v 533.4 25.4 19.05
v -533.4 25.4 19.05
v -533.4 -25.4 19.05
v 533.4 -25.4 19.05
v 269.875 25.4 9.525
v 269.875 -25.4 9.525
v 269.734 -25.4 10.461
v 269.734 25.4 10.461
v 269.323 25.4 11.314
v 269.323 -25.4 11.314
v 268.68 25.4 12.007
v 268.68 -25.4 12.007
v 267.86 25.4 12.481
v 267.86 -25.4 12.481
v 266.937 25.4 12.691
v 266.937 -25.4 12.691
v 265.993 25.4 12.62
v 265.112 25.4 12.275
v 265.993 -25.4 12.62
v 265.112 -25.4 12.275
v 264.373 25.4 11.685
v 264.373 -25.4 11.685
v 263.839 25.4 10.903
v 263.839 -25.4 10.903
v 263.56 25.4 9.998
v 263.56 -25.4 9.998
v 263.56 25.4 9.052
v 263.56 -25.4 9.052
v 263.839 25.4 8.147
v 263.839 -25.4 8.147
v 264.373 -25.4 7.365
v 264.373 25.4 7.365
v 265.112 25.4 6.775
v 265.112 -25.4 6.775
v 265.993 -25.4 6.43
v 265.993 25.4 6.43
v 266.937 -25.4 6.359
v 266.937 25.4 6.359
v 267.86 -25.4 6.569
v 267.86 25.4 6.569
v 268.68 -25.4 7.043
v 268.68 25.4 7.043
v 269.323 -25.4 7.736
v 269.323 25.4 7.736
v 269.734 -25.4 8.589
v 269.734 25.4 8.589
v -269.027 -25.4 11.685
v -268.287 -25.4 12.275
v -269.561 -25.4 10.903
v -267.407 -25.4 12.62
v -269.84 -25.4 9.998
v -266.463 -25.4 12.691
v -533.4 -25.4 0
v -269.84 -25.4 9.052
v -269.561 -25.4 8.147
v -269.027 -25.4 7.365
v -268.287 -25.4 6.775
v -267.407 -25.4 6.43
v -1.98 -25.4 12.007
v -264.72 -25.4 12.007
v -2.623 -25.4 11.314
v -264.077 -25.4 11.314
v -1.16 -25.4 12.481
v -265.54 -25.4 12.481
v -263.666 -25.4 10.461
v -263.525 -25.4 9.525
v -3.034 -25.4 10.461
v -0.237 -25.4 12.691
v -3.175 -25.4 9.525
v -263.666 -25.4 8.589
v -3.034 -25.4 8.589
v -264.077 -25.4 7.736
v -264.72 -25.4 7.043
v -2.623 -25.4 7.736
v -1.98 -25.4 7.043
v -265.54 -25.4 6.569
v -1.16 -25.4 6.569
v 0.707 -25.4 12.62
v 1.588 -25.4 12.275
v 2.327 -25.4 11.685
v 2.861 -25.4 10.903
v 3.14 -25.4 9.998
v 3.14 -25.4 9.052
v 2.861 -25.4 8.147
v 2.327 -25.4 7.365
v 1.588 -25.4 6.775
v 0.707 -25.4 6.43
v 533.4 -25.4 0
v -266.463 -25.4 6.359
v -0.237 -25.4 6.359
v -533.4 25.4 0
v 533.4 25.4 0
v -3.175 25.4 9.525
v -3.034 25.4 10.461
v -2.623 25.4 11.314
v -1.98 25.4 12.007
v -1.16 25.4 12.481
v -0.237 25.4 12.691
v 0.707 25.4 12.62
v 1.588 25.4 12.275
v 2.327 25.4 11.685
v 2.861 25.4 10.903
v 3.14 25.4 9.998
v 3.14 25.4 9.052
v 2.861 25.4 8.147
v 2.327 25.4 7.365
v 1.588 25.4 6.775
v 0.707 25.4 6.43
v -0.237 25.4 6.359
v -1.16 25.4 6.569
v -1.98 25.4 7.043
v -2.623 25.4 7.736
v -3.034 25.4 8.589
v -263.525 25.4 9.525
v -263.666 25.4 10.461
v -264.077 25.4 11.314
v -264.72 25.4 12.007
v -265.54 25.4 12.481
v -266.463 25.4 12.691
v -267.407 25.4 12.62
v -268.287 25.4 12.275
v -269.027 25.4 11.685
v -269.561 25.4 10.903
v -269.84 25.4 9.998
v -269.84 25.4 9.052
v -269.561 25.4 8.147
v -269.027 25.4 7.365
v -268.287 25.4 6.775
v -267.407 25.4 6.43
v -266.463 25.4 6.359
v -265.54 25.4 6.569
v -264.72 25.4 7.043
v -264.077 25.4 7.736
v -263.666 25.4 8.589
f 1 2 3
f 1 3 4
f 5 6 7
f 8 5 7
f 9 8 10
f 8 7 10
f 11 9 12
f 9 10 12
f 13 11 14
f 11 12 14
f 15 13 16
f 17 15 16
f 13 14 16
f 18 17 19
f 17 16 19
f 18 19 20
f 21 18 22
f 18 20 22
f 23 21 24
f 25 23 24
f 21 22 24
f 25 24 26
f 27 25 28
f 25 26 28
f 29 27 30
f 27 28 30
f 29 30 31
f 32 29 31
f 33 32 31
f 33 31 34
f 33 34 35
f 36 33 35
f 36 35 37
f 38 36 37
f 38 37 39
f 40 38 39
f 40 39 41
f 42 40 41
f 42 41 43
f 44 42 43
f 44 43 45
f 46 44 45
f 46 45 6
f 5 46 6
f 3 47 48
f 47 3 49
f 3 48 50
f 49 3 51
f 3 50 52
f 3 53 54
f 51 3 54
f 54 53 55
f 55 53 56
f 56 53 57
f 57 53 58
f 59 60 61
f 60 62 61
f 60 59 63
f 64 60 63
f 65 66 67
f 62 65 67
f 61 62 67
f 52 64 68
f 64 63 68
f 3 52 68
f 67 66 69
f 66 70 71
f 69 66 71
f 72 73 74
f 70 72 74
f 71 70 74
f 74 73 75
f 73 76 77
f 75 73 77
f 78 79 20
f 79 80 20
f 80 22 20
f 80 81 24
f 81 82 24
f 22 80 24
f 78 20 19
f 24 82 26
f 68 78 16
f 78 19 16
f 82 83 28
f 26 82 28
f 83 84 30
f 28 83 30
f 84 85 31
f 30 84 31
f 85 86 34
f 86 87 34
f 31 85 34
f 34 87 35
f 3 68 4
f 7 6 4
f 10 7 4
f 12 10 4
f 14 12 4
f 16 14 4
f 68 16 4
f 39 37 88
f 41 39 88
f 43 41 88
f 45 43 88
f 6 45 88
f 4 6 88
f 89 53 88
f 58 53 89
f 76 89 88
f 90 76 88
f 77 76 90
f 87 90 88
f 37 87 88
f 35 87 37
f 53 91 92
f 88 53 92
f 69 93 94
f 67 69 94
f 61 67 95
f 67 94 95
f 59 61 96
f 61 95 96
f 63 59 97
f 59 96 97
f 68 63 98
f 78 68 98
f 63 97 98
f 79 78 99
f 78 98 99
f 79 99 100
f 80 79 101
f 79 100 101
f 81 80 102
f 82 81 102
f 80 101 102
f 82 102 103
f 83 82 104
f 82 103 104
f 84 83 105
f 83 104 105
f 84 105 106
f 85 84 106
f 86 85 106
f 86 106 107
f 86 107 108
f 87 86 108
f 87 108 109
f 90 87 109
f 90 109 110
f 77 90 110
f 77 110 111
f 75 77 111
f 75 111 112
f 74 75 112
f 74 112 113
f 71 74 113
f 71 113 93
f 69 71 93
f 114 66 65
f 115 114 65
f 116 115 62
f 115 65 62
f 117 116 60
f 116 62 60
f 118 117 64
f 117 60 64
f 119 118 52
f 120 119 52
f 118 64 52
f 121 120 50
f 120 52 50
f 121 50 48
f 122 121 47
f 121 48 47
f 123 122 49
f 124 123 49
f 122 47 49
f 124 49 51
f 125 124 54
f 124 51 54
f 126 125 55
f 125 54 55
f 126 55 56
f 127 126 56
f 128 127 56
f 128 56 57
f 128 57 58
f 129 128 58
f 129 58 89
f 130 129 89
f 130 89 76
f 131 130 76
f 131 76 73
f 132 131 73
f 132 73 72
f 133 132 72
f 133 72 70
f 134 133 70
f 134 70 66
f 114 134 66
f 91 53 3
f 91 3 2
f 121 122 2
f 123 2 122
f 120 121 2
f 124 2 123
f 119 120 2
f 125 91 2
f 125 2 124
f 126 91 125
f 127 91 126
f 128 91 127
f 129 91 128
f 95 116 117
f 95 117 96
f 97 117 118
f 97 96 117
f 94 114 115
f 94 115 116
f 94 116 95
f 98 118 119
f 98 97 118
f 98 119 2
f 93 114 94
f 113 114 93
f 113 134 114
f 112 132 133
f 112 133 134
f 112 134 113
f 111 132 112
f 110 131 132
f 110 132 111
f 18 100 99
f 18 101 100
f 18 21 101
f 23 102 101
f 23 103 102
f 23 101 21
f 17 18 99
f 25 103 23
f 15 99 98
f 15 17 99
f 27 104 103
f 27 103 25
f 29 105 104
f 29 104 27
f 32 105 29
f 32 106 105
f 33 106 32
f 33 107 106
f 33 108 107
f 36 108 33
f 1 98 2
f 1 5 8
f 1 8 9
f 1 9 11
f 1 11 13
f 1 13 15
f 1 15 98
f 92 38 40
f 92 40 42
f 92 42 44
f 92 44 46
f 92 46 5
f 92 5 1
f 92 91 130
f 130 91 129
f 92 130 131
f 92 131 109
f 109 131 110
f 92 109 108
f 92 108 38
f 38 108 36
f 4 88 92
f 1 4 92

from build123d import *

# Parameters (mm, degrees)
F0_W     = 1066.8
F0_H     = 50.8
F1_DEPTH = 19.05
F2_R     = 3.175
F3_DEPTH = 50.801
F4_R     = 3.175
F5_DEPTH = 50.801


with BuildPart() as f1:
    # F0 (on Top) → F1 (new body)
    with BuildSketch(Plane.XY):
        Rectangle(F0_W, F0_H)
    extrude(amount=F1_DEPTH)

    # F2 (on face) → F3 (cut, through all)
    with BuildSketch(Plane(origin=(0, 25.4, 0), x_dir=(-1, 0, 0), z_dir=(0, 1, 0))):
        with Locations((0, 9.525)):
            Circle(F2_R)
    extrude(amount=-F3_DEPTH, mode=Mode.SUBTRACT)

    # F4 (on face) → F5 (cut, through all)
    with BuildSketch(Plane.XZ.offset(25.4)):
        with Locations((-266.7, 9.525)):
            Circle(F4_R)
        with Locations((266.7, 9.525)):
            Circle(F4_R)
    extrude(amount=-F5_DEPTH, mode=Mode.SUBTRACT)


solid = f1.part
